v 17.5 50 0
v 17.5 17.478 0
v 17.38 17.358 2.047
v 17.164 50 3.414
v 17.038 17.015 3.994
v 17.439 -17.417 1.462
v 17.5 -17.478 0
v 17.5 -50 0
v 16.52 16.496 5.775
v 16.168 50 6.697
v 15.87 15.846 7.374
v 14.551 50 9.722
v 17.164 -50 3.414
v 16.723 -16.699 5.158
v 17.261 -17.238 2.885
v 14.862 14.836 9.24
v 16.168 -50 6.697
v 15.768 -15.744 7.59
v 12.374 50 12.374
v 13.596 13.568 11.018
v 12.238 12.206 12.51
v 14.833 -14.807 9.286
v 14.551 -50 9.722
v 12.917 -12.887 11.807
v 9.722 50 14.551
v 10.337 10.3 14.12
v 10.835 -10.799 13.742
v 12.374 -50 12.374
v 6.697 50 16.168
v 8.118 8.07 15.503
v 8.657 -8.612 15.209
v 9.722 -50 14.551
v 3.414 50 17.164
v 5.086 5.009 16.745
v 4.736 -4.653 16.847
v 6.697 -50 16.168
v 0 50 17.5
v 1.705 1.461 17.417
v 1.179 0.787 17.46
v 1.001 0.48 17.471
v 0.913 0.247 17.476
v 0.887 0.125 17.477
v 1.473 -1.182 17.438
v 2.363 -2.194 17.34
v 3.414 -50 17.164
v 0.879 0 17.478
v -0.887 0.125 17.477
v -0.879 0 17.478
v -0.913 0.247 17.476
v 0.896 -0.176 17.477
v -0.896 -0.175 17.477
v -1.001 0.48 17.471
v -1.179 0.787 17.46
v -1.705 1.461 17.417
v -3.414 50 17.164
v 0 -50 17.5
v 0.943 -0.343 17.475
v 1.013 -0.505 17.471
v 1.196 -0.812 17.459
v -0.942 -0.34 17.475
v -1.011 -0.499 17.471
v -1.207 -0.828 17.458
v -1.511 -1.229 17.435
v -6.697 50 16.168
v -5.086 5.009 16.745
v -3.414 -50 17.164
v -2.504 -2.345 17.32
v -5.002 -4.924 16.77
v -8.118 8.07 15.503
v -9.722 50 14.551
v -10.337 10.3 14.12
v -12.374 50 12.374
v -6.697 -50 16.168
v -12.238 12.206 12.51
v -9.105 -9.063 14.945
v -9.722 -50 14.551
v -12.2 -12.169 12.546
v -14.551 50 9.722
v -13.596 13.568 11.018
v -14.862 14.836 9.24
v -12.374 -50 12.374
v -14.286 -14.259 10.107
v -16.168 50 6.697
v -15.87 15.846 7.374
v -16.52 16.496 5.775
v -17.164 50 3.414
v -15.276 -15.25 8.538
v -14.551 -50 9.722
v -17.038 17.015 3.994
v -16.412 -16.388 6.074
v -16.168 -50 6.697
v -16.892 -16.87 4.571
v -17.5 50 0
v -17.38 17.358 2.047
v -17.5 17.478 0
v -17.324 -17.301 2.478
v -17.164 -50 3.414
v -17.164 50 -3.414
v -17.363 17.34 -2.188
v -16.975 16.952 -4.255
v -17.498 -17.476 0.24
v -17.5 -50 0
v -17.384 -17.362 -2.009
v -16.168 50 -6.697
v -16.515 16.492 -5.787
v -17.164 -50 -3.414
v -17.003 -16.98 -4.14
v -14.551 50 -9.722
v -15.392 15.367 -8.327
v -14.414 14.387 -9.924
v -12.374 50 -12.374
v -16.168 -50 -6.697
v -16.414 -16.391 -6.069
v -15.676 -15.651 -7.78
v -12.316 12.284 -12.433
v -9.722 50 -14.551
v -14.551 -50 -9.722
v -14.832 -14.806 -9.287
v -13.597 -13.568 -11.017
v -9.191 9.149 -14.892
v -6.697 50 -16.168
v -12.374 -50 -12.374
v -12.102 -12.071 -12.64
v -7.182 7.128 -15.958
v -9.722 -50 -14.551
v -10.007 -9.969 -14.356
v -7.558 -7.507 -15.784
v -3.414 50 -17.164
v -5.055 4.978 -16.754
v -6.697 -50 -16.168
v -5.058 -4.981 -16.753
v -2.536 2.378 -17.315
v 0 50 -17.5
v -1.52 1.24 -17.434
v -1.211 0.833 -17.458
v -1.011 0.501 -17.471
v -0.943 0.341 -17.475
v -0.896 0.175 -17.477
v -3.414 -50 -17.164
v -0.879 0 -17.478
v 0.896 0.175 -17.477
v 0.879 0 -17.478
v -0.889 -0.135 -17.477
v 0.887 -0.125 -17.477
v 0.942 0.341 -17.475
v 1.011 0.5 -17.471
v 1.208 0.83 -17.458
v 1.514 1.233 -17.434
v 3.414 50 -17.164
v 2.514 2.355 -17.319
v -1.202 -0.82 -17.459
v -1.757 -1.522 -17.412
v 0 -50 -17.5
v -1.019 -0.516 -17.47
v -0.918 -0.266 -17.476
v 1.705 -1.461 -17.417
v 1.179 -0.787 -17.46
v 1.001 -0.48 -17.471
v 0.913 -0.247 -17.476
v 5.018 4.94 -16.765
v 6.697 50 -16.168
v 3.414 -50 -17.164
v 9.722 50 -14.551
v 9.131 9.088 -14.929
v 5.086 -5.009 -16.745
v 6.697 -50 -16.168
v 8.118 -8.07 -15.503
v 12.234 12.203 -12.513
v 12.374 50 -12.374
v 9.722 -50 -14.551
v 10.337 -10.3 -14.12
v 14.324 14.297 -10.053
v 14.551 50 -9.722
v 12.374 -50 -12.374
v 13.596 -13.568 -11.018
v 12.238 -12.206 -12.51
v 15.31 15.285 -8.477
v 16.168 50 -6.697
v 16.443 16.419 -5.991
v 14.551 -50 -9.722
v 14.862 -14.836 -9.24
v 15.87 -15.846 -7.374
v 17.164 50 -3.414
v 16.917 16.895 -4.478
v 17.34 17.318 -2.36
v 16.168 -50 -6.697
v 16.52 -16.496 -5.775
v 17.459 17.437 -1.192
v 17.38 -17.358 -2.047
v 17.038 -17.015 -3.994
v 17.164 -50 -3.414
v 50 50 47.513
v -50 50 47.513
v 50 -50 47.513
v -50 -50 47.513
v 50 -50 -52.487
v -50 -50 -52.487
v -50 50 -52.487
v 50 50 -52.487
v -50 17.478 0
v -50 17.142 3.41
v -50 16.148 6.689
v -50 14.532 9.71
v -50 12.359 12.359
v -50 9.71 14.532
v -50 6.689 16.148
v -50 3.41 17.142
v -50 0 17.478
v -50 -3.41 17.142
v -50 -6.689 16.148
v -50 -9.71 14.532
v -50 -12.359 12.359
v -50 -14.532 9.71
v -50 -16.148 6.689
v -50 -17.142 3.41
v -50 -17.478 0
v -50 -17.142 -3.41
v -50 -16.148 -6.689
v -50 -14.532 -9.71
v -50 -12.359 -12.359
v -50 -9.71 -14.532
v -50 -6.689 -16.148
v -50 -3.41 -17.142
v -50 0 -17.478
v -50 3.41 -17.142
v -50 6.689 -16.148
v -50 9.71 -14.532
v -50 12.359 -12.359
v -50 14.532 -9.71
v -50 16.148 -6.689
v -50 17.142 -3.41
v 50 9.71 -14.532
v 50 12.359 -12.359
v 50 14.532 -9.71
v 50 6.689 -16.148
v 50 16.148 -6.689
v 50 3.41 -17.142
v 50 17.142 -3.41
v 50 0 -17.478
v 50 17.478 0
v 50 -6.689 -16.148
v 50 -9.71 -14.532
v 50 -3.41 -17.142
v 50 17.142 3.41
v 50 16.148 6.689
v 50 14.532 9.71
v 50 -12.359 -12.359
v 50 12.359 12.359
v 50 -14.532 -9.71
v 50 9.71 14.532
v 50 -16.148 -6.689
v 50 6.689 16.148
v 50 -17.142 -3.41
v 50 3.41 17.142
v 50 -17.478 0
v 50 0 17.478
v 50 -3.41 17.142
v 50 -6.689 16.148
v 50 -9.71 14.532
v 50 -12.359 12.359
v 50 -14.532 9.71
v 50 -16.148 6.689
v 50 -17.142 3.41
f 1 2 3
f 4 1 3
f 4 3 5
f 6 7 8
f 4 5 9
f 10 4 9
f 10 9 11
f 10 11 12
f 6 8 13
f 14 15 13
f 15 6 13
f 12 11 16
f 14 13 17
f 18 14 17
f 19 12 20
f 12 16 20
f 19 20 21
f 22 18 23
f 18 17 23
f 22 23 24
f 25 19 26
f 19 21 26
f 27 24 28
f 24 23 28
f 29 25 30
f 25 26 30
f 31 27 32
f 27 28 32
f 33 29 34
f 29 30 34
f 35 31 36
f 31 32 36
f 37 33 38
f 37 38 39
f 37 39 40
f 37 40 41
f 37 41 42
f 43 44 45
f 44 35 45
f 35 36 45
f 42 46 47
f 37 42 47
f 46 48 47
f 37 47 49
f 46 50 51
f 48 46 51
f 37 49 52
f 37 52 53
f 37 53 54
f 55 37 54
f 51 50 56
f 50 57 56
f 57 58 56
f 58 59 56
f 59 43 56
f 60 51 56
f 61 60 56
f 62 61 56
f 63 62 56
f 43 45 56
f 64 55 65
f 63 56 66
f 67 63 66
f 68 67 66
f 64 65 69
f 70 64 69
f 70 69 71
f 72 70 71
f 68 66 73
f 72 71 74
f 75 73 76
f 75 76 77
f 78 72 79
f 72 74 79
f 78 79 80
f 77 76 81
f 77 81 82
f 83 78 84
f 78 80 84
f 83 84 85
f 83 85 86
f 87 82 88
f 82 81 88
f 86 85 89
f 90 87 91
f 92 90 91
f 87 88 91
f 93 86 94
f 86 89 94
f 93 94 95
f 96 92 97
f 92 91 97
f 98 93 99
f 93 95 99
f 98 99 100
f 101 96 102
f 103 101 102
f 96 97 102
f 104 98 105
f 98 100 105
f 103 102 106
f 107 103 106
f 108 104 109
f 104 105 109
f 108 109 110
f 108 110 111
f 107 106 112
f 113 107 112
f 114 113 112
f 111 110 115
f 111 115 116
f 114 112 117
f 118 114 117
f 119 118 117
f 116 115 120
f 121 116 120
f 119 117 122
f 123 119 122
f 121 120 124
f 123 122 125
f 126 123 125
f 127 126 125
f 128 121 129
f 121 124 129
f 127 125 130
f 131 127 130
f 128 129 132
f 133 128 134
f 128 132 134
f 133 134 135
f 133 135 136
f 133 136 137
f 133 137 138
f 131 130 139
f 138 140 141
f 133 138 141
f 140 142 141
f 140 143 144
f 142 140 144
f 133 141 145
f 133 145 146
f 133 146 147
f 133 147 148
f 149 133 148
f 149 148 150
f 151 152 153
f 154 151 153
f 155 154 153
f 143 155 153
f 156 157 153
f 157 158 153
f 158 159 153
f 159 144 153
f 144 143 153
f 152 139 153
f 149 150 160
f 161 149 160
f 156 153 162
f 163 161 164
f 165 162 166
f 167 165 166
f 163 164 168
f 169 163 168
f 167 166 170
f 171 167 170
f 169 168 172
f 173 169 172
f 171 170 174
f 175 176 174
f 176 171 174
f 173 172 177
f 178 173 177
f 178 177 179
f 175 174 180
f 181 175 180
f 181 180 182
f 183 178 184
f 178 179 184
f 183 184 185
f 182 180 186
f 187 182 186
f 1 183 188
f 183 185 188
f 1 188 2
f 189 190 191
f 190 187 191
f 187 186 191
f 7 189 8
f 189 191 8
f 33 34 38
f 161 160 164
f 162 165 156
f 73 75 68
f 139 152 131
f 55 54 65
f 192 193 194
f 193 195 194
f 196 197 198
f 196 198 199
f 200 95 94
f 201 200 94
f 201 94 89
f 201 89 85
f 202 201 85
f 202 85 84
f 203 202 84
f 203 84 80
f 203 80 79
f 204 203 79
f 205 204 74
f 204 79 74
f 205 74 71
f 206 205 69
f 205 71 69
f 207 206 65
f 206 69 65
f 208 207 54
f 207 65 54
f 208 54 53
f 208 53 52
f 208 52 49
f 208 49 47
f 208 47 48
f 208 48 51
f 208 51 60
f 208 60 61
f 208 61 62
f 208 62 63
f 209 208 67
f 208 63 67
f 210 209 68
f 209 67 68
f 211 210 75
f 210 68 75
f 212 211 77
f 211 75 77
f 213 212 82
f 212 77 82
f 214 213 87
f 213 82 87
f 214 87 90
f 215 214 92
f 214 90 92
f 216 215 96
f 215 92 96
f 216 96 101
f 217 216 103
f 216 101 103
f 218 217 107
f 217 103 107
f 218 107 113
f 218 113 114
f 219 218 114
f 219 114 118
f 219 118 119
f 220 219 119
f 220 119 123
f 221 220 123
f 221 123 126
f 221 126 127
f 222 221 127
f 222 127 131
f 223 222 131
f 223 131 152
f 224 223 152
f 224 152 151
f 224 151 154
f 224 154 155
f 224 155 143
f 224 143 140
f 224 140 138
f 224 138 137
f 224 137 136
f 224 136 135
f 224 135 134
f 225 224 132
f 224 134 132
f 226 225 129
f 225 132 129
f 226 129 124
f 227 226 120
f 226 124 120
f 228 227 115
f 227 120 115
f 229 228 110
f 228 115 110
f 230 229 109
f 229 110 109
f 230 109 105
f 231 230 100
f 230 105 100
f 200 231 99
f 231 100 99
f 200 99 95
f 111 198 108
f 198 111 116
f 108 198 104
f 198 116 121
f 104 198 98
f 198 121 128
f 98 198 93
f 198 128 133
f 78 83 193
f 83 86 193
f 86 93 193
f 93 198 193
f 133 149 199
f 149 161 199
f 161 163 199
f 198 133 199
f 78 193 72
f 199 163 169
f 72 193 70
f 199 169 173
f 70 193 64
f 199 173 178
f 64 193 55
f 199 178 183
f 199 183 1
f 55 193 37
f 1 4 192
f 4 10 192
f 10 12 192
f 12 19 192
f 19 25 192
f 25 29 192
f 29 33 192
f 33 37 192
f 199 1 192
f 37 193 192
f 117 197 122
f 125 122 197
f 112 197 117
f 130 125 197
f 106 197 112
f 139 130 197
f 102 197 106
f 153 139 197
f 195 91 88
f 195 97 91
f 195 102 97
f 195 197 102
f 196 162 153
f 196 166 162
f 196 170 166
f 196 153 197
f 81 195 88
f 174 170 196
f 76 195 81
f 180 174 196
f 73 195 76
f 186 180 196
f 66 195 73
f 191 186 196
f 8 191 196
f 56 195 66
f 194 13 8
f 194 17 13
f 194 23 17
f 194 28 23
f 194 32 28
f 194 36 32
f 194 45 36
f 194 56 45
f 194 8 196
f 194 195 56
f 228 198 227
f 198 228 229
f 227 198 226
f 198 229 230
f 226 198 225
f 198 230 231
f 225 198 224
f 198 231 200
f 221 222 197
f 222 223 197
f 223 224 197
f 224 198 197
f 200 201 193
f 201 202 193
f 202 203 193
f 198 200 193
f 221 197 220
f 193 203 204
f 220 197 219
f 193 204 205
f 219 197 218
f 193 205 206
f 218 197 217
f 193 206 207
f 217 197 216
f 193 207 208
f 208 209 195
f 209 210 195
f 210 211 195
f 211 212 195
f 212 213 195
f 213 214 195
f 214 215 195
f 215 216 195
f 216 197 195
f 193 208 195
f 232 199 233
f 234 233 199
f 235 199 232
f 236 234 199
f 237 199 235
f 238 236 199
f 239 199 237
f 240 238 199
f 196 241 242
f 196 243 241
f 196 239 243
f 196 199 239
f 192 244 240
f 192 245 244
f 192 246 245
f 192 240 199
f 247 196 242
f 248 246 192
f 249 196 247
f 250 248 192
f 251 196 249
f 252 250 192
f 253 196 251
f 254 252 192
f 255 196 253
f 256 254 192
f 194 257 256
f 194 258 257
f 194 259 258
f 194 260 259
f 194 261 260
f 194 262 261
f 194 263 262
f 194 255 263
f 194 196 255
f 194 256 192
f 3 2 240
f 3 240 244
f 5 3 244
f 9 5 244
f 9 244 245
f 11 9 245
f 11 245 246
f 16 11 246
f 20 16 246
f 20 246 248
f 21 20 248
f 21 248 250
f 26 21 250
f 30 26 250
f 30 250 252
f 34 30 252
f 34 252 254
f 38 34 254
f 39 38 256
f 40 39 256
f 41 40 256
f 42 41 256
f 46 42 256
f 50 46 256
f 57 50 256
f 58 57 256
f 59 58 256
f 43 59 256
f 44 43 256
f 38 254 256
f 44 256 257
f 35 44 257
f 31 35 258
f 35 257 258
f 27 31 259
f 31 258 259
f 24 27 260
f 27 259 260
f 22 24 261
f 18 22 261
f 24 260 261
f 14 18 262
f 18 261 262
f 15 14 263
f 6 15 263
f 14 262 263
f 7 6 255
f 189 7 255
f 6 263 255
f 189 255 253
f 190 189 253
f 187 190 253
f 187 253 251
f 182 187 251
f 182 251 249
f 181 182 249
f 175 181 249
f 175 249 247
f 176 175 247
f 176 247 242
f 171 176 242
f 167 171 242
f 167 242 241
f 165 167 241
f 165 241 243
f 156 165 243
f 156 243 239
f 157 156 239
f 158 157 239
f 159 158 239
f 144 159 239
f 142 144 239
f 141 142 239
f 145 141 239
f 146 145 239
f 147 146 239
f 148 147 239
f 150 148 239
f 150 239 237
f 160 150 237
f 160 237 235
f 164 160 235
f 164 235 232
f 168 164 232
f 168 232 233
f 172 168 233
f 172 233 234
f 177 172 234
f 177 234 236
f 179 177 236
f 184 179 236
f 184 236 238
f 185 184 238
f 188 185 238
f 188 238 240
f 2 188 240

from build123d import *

# Parameters (mm, degrees)
F0_W          = 100
F0_H          = 100
F1_DEPTH      = 50
F2_R          = 17.5
F3_DEPTH      = 50
F3_DEPTH_BACK = 110
F4_R          = 17.4779300175
F1_FACE1_W    = 100
F1_FACE1_H    = 100
F5_DEPTH      = 100.001


with BuildPart() as f1:
    # F0 (on Front) → F1 (new body, symmetric)
    with BuildSketch(Plane.XZ):
        with Locations((0, -2.4868422188)):
            Rectangle(F0_W, F0_H)
    extrude(amount=F1_DEPTH, both=True)

    # F2 (on Front) → F3 (cut, two sides)
    with BuildSketch(Plane.XZ) as f3_sk:
        Circle(F2_R)
    extrude(amount=F3_DEPTH, mode=Mode.SUBTRACT)
    extrude(f3_sk.sketch, amount=-F3_DEPTH_BACK, mode=Mode.SUBTRACT)

    # F4 (on face) + F1_face1 (on face) → F5 (cut, through all)
    with BuildSketch(Plane.YZ.offset(50)):
        Circle(F4_R)
    with BuildSketch(Plane(origin=(-50, 0, -2.4868422188), x_dir=(0, -1, 0), z_dir=(-1, 0, 0))):
        Rectangle(F1_FACE1_W, F1_FACE1_H)
    extrude(amount=-F5_DEPTH, dir=(1, 0, 0), mode=Mode.SUBTRACT)


solid = f1.part
